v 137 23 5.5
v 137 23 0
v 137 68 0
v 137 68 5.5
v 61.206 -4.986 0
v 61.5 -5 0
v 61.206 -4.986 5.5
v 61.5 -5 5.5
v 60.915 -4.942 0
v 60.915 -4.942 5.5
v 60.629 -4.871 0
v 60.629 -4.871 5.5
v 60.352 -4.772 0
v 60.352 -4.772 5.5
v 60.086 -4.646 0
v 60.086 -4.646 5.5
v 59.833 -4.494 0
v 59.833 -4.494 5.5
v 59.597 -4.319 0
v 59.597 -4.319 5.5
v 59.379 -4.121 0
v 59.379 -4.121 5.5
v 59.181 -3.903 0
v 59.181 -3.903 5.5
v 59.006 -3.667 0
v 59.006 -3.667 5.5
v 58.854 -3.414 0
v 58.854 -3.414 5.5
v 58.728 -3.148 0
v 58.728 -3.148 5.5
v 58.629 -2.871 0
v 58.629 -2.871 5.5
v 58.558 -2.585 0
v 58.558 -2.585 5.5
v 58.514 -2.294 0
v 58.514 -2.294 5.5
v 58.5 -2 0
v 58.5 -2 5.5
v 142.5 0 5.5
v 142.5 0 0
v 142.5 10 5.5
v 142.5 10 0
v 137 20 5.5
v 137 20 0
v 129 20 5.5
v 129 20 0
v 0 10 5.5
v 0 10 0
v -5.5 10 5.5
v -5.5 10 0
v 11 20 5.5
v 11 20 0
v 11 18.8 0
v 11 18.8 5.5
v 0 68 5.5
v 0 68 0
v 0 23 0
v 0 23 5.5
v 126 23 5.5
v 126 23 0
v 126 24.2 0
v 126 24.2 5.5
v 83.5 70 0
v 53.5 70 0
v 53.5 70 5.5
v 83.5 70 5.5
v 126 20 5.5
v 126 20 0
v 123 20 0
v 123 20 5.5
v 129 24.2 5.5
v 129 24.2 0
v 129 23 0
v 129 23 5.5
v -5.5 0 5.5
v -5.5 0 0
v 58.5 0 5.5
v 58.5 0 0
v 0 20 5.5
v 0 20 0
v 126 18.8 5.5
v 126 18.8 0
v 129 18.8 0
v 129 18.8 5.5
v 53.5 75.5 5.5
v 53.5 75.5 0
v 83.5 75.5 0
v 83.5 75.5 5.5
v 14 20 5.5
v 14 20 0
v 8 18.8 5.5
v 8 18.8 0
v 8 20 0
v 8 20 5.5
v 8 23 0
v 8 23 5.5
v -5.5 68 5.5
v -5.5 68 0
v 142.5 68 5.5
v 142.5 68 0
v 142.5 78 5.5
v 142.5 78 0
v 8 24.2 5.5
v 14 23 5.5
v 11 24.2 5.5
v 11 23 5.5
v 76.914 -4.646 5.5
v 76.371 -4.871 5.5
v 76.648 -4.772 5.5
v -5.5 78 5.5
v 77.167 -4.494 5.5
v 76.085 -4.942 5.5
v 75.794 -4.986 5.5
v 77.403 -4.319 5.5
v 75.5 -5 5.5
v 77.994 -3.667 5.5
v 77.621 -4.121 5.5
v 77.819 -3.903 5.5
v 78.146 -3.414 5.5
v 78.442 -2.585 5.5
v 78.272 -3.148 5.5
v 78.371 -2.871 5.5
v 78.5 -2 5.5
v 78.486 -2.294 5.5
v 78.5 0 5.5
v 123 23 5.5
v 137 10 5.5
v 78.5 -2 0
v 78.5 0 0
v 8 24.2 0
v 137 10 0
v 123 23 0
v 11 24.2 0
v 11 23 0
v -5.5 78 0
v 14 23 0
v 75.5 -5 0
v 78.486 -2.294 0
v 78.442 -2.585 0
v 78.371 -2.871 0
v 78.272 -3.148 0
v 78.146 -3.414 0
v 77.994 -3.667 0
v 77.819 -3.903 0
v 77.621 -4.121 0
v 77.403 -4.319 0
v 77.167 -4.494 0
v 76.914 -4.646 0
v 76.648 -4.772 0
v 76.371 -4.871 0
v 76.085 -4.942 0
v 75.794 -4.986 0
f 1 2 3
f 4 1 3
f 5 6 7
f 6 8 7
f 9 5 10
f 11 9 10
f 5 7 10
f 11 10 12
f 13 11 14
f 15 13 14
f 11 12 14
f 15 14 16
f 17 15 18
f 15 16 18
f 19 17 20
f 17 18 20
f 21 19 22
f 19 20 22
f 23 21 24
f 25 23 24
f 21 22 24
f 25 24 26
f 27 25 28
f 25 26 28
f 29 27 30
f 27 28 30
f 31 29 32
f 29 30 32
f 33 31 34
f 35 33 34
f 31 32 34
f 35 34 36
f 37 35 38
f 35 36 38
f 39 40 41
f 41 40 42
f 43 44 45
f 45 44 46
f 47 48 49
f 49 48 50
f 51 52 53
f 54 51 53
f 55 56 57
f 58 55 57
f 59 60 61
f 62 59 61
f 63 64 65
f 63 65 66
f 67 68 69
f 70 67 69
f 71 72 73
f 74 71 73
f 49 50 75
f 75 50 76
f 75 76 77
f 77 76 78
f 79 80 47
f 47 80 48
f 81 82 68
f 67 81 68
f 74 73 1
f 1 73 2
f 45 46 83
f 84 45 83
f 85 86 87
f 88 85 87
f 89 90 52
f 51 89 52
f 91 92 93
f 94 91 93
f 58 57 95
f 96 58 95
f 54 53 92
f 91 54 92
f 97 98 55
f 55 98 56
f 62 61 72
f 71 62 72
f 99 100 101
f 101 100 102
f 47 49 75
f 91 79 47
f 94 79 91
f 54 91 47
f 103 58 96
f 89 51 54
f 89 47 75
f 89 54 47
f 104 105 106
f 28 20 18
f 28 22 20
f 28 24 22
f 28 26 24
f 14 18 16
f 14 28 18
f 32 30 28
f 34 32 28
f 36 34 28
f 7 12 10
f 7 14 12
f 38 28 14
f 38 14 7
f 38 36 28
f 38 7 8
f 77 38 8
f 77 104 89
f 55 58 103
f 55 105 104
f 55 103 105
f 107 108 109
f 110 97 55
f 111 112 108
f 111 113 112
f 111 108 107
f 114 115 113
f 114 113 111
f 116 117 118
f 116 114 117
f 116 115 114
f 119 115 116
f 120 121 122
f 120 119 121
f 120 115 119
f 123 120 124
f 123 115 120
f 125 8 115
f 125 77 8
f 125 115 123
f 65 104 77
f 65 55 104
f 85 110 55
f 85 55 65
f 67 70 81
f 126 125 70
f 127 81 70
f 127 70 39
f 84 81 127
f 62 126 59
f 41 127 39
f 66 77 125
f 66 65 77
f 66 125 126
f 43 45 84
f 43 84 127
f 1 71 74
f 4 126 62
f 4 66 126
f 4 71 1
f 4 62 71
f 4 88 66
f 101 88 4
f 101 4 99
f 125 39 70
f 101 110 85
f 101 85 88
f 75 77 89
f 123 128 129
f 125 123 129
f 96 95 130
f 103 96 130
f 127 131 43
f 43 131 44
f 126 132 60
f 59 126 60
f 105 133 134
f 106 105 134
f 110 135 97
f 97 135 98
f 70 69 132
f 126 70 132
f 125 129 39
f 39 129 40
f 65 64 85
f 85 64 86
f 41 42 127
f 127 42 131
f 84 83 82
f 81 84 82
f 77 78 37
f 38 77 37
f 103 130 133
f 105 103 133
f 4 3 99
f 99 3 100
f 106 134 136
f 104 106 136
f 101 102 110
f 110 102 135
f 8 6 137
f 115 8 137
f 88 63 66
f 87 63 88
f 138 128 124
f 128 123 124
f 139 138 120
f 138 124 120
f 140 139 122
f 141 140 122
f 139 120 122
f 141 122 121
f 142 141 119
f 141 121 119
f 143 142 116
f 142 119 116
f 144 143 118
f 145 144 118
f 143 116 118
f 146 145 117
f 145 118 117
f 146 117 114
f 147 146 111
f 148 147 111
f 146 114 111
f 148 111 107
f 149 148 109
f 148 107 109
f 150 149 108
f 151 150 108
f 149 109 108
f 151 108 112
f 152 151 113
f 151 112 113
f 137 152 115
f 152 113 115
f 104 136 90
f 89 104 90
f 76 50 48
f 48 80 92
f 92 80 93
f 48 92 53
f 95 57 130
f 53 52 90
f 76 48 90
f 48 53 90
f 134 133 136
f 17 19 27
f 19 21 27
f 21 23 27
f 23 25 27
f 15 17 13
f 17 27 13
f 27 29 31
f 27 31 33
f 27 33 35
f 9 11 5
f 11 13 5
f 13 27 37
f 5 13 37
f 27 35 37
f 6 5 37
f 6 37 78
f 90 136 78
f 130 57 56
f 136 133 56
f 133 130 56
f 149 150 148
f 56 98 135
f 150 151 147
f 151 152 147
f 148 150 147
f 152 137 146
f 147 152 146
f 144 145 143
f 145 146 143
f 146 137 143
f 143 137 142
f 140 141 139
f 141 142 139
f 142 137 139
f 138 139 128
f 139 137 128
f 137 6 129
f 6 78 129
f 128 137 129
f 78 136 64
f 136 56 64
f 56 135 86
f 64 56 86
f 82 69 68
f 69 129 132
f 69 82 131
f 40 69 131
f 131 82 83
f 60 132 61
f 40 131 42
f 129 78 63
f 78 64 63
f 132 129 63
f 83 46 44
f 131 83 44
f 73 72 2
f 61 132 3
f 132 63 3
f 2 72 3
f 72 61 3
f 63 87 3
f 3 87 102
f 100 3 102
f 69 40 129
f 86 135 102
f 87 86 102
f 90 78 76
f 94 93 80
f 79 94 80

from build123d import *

# Parameters (mm, degrees)
SKETCH1_W           = 30
SKETCH1_H           = 5.5
BOSS_EXTRUDE2_DEPTH = 5.5
FILLET1_R           = 3
FILLET2_R           = 3


with BuildPart() as part:
    # Sketch1 → Boss-Extrude2 (new body)
    with BuildSketch(Plane.XY):
        Polygon((78.5, 0), (137, 0), (142.5, 0), (142.5, 10), (137, 10), (137, 20), (129, 20), (129, 18.8), (126, 18.8), (126, 20), (123, 20), (123, 23), (126, 23), (126, 24.2), (129, 24.2), (129, 23), (137, 23), (137, 68), (142.5, 68), (142.5, 78), (137, 78), (0, 78), (-5.5, 78), (-5.5, 68), (0, 68), (0, 23), (8, 23), (8, 24.2), (11, 24.2), (11, 23), (14, 23), (14, 20), (11, 20), (11, 18.8), (8, 18.8), (8, 20), (0, 20), (0, 10), (-5.5, 10), (-5.5, 0), (0, 0), (58.5, 0), (58.5, -5), (78.5, -5), align=None)
        with Locations((68.5, 72.75)):
            Rectangle(SKETCH1_W, SKETCH1_H, mode=Mode.SUBTRACT)
    extrude(amount=BOSS_EXTRUDE2_DEPTH)

    # Fillet1
    fillet1_edges = [part.edges().sort_by_distance(p)[0] for p in [
        (78.5, -5, 2.75),
    ]]
    fillet(fillet1_edges, radius=FILLET1_R)

    # Fillet2
    fillet2_edges = [part.edges().sort_by_distance(p)[0] for p in [
        (58.5, -5, 2.75),
    ]]
    fillet(fillet2_edges, radius=FILLET2_R)


solid = part.part
